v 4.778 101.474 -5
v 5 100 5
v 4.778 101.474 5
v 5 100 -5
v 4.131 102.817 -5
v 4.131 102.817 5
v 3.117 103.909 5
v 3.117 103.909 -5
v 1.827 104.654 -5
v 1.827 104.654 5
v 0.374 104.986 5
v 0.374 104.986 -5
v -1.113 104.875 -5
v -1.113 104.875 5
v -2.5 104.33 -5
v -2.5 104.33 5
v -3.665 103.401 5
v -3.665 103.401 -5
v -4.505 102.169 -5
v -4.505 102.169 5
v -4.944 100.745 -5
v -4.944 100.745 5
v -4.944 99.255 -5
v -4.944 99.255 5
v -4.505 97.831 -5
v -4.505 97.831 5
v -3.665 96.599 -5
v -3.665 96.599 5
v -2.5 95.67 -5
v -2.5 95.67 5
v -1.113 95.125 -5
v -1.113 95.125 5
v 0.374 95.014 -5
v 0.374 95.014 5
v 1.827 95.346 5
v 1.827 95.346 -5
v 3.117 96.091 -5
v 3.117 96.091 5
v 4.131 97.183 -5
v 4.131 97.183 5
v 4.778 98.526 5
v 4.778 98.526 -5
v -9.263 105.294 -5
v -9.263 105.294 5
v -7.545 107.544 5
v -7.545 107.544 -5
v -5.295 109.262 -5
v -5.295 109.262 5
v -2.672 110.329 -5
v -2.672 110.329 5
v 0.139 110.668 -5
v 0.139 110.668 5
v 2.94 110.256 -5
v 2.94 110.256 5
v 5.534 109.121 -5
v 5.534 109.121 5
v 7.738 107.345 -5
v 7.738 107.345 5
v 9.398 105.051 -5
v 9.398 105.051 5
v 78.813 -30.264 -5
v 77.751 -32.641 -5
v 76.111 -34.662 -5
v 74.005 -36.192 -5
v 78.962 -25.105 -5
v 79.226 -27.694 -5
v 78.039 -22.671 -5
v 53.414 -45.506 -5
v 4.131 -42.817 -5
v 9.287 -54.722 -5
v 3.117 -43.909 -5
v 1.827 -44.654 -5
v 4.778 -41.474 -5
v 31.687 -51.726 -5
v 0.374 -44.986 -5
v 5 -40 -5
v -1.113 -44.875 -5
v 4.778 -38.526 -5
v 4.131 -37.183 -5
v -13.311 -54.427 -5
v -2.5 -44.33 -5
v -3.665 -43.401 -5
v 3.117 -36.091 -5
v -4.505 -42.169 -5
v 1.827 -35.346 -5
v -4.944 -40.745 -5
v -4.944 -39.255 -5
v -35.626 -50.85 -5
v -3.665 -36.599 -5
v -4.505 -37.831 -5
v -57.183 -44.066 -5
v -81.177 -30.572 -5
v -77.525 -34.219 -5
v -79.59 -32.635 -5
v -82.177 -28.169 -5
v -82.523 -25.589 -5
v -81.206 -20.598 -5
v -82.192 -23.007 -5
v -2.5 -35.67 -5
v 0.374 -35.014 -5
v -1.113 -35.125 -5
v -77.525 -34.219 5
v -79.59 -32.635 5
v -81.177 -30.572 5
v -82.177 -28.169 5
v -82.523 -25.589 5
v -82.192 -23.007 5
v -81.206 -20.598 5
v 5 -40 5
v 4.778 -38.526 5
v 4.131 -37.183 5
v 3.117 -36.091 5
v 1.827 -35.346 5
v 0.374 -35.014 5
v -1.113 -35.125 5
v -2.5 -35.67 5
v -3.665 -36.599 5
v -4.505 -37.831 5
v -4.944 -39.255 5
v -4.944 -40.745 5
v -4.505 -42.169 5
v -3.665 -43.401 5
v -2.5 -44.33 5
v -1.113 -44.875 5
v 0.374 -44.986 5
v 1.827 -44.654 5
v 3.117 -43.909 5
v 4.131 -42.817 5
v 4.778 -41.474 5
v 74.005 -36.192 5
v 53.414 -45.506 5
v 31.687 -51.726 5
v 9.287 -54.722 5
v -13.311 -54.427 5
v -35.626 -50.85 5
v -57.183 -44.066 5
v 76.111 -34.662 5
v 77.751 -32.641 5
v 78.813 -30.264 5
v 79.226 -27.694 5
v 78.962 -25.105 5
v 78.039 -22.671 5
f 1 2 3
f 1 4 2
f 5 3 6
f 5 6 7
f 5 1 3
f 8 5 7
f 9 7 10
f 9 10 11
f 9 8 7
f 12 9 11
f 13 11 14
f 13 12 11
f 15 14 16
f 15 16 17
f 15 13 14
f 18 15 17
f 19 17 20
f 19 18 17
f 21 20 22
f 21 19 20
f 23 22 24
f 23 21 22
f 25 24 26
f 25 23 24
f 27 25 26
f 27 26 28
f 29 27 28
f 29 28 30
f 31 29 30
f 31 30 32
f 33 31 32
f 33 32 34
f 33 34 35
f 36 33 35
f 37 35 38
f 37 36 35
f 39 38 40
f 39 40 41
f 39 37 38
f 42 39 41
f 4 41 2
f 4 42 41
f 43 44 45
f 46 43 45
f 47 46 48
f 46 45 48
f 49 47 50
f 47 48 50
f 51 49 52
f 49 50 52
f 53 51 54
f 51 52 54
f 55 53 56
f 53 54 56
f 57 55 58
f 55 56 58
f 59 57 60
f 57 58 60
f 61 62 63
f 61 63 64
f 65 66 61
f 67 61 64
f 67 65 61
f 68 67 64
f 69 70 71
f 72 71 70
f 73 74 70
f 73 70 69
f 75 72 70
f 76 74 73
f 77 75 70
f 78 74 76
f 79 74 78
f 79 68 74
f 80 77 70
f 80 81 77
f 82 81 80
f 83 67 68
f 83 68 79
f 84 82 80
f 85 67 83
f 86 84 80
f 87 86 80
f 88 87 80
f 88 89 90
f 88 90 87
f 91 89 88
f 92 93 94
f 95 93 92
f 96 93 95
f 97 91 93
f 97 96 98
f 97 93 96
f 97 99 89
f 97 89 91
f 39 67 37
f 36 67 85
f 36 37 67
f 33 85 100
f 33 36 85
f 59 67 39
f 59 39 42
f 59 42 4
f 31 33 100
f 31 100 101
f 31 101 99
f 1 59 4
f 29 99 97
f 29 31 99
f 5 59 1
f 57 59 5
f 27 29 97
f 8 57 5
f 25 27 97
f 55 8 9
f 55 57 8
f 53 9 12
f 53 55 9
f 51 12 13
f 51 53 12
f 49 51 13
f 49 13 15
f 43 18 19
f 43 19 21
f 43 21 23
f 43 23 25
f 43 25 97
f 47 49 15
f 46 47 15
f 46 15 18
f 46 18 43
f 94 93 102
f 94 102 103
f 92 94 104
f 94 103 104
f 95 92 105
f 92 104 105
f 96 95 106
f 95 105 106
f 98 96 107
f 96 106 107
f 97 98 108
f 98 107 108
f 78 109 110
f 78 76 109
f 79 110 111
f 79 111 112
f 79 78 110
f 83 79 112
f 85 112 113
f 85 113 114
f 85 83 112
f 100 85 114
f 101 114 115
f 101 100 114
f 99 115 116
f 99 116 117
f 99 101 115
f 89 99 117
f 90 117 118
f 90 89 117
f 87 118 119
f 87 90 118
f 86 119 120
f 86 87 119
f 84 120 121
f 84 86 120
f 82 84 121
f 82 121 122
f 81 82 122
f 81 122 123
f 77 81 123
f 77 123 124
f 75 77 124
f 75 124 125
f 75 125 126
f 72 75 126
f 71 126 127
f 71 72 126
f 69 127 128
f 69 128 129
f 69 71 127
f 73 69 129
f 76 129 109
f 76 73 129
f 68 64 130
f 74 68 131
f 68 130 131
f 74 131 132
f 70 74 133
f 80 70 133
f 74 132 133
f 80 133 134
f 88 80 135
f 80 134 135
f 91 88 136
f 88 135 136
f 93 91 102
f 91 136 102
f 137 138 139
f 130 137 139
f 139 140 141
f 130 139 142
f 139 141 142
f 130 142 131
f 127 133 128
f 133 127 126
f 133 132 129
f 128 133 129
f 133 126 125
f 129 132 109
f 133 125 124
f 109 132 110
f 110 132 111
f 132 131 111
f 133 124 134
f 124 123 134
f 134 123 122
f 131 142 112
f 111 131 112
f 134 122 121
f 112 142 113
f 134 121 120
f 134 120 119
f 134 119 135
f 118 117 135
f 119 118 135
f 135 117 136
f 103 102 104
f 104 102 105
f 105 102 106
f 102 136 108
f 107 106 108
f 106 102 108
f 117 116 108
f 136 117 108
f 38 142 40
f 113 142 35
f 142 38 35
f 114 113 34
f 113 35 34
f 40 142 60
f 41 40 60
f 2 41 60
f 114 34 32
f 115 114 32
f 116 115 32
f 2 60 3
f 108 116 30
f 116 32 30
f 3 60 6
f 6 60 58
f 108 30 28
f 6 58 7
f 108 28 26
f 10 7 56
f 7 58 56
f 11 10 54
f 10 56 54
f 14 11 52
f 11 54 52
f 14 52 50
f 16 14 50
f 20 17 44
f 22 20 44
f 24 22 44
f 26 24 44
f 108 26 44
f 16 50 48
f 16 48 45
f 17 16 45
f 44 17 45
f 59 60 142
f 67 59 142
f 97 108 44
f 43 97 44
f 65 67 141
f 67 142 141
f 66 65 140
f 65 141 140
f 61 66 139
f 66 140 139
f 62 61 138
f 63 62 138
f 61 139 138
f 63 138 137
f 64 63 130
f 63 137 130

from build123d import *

# Parameters (mm, degrees)
SKETCH1_R          = 5
BASE_EXTRUDE_DEPTH = 5


with BuildPart() as part:
    # Sketch1 → Base-Extrude (new, symmetric)
    with BuildSketch(Plane.XY):
        with BuildLine():
            Line((9.397696336, 105.05059331), (78.039168607, -22.671373759))
            ThreePointArc((78.039168607, -22.671373759), (78.813241725, -30.264373144), (74.00519187, -36.191892476))
            ThreePointArc((74.00519187, -36.191892476), (-2.017468863, -54.986869829), (-77.525144227, -34.21941742))
            ThreePointArc((-77.525144227, -34.21941742), (-82.177273716, -28.168754641), (-81.205819752, -20.598476837))
            Line((-81.205819752, -20.598476837), (-9.263046944, 105.293500781))
            ThreePointArc((-9.263046944, 105.293500781), (0.138865491, 110.667985076), (9.397696336, 105.05059331))
        make_face()
        with Locations((0, -40)):
            Circle(SKETCH1_R, mode=Mode.SUBTRACT)
        with Locations((0, 100)):
            Circle(SKETCH1_R, mode=Mode.SUBTRACT)
    extrude(amount=BASE_EXTRUDE_DEPTH, both=True)


solid = part.part
